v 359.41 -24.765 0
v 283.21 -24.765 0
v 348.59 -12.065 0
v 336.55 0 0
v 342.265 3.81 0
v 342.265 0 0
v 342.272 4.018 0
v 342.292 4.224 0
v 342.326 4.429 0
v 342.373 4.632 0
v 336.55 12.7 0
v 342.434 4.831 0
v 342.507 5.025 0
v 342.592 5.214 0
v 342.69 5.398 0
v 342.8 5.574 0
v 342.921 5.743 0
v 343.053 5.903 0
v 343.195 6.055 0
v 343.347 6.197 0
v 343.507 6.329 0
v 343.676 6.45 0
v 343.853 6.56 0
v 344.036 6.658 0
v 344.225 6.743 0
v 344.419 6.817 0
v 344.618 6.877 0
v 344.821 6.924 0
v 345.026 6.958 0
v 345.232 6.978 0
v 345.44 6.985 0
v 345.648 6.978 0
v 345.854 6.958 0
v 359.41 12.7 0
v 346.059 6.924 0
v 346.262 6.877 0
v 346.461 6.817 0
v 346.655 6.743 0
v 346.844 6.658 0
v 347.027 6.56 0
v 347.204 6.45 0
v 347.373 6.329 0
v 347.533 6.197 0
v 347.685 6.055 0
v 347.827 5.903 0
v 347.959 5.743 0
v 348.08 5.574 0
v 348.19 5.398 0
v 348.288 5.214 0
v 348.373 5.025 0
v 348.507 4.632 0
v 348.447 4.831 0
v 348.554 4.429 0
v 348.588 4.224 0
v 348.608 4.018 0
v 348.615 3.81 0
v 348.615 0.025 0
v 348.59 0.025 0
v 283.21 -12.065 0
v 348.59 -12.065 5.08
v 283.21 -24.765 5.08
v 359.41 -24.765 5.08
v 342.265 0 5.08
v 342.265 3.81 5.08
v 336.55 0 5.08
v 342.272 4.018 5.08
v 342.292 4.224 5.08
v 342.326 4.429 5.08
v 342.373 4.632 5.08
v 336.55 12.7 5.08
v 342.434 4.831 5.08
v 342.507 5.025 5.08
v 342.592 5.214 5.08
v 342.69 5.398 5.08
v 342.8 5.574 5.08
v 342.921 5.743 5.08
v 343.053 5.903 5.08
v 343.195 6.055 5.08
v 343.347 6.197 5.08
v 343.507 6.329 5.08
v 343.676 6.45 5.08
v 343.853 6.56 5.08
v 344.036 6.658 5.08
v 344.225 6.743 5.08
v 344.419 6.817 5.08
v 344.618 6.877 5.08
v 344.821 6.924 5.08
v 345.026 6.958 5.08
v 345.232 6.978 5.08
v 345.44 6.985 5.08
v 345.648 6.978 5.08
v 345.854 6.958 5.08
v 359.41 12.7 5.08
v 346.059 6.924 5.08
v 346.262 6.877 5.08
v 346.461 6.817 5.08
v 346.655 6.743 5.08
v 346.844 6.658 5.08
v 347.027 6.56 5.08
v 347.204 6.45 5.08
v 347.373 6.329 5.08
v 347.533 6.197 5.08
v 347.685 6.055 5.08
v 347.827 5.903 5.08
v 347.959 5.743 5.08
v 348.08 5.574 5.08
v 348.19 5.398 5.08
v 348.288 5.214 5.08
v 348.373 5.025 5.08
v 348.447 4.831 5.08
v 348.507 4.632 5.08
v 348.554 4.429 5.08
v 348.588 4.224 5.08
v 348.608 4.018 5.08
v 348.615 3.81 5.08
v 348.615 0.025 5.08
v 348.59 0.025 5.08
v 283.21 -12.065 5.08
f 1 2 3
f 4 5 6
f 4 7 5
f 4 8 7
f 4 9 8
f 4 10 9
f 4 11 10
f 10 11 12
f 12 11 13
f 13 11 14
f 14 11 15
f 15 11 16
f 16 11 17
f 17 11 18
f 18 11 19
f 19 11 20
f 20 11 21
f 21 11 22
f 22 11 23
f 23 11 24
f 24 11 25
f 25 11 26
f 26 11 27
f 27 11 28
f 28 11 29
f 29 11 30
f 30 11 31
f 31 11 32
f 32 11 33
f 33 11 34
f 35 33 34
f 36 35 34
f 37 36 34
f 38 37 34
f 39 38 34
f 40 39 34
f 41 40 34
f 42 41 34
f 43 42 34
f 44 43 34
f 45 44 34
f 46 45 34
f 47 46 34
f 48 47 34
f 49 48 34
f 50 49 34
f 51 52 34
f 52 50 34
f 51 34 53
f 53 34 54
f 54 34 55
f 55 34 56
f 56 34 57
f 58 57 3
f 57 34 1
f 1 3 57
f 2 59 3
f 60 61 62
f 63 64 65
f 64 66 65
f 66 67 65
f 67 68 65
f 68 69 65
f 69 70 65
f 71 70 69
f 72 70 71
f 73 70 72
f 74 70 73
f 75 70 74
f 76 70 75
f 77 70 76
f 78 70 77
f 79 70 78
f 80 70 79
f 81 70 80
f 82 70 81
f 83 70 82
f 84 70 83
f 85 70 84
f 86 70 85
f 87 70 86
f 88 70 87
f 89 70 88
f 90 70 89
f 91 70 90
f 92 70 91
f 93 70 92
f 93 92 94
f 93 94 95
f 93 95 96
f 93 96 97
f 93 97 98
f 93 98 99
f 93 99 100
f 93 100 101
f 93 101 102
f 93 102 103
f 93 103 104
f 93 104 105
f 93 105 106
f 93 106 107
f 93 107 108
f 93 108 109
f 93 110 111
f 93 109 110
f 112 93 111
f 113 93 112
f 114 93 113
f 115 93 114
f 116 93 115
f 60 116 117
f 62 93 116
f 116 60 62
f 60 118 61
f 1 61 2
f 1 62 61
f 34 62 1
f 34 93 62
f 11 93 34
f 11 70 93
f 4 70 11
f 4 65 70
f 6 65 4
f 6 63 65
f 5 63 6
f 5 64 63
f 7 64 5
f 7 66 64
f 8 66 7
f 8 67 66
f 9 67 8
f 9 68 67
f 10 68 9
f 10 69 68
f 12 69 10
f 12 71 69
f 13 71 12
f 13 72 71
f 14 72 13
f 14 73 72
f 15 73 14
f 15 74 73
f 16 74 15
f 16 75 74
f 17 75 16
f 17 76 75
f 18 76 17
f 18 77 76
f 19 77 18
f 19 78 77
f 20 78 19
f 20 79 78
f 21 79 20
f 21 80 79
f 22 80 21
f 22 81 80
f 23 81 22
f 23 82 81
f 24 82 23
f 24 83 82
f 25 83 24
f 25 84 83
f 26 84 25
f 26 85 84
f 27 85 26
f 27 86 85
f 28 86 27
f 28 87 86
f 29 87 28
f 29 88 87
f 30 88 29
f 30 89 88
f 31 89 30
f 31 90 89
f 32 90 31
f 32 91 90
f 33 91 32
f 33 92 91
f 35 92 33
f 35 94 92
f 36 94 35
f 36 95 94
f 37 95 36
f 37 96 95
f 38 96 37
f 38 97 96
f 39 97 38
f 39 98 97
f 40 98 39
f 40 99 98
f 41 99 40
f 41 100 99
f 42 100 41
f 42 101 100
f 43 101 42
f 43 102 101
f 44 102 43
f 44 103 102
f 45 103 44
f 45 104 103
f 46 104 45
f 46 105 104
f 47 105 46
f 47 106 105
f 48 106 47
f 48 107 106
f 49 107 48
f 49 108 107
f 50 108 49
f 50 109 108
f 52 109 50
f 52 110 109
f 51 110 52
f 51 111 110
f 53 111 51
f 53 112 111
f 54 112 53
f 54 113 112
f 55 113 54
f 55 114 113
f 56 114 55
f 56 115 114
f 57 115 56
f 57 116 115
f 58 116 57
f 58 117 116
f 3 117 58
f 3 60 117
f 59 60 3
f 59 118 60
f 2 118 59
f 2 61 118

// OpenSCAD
ViewScale = [0.0254, 0.0254, 0.0254];

module upper()
{
//    module template(r) {
//        rotate([0, 0, r])
//        rotate_extrude(angle = 15, convexity=2, $fn=96)
linear_extrude(200)
        translate([13500-250, 0, 0]) {
            difference() {
                square([900, 500]);
                translate([350, 150]) 
                circle(250/2, $fn=96);
                translate([225, -100, 0])
                square([250, 250]);
            }
            // Spine
            translate([474, -475, 0])
            square([426, 476]);
            // Chin
            translate([-2100, -975, 0])
            square([3000, 500]);
        }
//    }
//    template(15); 
//    template(-30);

}

module forViewing()
{
    upper();
}

module forPrinting()
{
}

scale(ViewScale)
{
    forViewing();
}
